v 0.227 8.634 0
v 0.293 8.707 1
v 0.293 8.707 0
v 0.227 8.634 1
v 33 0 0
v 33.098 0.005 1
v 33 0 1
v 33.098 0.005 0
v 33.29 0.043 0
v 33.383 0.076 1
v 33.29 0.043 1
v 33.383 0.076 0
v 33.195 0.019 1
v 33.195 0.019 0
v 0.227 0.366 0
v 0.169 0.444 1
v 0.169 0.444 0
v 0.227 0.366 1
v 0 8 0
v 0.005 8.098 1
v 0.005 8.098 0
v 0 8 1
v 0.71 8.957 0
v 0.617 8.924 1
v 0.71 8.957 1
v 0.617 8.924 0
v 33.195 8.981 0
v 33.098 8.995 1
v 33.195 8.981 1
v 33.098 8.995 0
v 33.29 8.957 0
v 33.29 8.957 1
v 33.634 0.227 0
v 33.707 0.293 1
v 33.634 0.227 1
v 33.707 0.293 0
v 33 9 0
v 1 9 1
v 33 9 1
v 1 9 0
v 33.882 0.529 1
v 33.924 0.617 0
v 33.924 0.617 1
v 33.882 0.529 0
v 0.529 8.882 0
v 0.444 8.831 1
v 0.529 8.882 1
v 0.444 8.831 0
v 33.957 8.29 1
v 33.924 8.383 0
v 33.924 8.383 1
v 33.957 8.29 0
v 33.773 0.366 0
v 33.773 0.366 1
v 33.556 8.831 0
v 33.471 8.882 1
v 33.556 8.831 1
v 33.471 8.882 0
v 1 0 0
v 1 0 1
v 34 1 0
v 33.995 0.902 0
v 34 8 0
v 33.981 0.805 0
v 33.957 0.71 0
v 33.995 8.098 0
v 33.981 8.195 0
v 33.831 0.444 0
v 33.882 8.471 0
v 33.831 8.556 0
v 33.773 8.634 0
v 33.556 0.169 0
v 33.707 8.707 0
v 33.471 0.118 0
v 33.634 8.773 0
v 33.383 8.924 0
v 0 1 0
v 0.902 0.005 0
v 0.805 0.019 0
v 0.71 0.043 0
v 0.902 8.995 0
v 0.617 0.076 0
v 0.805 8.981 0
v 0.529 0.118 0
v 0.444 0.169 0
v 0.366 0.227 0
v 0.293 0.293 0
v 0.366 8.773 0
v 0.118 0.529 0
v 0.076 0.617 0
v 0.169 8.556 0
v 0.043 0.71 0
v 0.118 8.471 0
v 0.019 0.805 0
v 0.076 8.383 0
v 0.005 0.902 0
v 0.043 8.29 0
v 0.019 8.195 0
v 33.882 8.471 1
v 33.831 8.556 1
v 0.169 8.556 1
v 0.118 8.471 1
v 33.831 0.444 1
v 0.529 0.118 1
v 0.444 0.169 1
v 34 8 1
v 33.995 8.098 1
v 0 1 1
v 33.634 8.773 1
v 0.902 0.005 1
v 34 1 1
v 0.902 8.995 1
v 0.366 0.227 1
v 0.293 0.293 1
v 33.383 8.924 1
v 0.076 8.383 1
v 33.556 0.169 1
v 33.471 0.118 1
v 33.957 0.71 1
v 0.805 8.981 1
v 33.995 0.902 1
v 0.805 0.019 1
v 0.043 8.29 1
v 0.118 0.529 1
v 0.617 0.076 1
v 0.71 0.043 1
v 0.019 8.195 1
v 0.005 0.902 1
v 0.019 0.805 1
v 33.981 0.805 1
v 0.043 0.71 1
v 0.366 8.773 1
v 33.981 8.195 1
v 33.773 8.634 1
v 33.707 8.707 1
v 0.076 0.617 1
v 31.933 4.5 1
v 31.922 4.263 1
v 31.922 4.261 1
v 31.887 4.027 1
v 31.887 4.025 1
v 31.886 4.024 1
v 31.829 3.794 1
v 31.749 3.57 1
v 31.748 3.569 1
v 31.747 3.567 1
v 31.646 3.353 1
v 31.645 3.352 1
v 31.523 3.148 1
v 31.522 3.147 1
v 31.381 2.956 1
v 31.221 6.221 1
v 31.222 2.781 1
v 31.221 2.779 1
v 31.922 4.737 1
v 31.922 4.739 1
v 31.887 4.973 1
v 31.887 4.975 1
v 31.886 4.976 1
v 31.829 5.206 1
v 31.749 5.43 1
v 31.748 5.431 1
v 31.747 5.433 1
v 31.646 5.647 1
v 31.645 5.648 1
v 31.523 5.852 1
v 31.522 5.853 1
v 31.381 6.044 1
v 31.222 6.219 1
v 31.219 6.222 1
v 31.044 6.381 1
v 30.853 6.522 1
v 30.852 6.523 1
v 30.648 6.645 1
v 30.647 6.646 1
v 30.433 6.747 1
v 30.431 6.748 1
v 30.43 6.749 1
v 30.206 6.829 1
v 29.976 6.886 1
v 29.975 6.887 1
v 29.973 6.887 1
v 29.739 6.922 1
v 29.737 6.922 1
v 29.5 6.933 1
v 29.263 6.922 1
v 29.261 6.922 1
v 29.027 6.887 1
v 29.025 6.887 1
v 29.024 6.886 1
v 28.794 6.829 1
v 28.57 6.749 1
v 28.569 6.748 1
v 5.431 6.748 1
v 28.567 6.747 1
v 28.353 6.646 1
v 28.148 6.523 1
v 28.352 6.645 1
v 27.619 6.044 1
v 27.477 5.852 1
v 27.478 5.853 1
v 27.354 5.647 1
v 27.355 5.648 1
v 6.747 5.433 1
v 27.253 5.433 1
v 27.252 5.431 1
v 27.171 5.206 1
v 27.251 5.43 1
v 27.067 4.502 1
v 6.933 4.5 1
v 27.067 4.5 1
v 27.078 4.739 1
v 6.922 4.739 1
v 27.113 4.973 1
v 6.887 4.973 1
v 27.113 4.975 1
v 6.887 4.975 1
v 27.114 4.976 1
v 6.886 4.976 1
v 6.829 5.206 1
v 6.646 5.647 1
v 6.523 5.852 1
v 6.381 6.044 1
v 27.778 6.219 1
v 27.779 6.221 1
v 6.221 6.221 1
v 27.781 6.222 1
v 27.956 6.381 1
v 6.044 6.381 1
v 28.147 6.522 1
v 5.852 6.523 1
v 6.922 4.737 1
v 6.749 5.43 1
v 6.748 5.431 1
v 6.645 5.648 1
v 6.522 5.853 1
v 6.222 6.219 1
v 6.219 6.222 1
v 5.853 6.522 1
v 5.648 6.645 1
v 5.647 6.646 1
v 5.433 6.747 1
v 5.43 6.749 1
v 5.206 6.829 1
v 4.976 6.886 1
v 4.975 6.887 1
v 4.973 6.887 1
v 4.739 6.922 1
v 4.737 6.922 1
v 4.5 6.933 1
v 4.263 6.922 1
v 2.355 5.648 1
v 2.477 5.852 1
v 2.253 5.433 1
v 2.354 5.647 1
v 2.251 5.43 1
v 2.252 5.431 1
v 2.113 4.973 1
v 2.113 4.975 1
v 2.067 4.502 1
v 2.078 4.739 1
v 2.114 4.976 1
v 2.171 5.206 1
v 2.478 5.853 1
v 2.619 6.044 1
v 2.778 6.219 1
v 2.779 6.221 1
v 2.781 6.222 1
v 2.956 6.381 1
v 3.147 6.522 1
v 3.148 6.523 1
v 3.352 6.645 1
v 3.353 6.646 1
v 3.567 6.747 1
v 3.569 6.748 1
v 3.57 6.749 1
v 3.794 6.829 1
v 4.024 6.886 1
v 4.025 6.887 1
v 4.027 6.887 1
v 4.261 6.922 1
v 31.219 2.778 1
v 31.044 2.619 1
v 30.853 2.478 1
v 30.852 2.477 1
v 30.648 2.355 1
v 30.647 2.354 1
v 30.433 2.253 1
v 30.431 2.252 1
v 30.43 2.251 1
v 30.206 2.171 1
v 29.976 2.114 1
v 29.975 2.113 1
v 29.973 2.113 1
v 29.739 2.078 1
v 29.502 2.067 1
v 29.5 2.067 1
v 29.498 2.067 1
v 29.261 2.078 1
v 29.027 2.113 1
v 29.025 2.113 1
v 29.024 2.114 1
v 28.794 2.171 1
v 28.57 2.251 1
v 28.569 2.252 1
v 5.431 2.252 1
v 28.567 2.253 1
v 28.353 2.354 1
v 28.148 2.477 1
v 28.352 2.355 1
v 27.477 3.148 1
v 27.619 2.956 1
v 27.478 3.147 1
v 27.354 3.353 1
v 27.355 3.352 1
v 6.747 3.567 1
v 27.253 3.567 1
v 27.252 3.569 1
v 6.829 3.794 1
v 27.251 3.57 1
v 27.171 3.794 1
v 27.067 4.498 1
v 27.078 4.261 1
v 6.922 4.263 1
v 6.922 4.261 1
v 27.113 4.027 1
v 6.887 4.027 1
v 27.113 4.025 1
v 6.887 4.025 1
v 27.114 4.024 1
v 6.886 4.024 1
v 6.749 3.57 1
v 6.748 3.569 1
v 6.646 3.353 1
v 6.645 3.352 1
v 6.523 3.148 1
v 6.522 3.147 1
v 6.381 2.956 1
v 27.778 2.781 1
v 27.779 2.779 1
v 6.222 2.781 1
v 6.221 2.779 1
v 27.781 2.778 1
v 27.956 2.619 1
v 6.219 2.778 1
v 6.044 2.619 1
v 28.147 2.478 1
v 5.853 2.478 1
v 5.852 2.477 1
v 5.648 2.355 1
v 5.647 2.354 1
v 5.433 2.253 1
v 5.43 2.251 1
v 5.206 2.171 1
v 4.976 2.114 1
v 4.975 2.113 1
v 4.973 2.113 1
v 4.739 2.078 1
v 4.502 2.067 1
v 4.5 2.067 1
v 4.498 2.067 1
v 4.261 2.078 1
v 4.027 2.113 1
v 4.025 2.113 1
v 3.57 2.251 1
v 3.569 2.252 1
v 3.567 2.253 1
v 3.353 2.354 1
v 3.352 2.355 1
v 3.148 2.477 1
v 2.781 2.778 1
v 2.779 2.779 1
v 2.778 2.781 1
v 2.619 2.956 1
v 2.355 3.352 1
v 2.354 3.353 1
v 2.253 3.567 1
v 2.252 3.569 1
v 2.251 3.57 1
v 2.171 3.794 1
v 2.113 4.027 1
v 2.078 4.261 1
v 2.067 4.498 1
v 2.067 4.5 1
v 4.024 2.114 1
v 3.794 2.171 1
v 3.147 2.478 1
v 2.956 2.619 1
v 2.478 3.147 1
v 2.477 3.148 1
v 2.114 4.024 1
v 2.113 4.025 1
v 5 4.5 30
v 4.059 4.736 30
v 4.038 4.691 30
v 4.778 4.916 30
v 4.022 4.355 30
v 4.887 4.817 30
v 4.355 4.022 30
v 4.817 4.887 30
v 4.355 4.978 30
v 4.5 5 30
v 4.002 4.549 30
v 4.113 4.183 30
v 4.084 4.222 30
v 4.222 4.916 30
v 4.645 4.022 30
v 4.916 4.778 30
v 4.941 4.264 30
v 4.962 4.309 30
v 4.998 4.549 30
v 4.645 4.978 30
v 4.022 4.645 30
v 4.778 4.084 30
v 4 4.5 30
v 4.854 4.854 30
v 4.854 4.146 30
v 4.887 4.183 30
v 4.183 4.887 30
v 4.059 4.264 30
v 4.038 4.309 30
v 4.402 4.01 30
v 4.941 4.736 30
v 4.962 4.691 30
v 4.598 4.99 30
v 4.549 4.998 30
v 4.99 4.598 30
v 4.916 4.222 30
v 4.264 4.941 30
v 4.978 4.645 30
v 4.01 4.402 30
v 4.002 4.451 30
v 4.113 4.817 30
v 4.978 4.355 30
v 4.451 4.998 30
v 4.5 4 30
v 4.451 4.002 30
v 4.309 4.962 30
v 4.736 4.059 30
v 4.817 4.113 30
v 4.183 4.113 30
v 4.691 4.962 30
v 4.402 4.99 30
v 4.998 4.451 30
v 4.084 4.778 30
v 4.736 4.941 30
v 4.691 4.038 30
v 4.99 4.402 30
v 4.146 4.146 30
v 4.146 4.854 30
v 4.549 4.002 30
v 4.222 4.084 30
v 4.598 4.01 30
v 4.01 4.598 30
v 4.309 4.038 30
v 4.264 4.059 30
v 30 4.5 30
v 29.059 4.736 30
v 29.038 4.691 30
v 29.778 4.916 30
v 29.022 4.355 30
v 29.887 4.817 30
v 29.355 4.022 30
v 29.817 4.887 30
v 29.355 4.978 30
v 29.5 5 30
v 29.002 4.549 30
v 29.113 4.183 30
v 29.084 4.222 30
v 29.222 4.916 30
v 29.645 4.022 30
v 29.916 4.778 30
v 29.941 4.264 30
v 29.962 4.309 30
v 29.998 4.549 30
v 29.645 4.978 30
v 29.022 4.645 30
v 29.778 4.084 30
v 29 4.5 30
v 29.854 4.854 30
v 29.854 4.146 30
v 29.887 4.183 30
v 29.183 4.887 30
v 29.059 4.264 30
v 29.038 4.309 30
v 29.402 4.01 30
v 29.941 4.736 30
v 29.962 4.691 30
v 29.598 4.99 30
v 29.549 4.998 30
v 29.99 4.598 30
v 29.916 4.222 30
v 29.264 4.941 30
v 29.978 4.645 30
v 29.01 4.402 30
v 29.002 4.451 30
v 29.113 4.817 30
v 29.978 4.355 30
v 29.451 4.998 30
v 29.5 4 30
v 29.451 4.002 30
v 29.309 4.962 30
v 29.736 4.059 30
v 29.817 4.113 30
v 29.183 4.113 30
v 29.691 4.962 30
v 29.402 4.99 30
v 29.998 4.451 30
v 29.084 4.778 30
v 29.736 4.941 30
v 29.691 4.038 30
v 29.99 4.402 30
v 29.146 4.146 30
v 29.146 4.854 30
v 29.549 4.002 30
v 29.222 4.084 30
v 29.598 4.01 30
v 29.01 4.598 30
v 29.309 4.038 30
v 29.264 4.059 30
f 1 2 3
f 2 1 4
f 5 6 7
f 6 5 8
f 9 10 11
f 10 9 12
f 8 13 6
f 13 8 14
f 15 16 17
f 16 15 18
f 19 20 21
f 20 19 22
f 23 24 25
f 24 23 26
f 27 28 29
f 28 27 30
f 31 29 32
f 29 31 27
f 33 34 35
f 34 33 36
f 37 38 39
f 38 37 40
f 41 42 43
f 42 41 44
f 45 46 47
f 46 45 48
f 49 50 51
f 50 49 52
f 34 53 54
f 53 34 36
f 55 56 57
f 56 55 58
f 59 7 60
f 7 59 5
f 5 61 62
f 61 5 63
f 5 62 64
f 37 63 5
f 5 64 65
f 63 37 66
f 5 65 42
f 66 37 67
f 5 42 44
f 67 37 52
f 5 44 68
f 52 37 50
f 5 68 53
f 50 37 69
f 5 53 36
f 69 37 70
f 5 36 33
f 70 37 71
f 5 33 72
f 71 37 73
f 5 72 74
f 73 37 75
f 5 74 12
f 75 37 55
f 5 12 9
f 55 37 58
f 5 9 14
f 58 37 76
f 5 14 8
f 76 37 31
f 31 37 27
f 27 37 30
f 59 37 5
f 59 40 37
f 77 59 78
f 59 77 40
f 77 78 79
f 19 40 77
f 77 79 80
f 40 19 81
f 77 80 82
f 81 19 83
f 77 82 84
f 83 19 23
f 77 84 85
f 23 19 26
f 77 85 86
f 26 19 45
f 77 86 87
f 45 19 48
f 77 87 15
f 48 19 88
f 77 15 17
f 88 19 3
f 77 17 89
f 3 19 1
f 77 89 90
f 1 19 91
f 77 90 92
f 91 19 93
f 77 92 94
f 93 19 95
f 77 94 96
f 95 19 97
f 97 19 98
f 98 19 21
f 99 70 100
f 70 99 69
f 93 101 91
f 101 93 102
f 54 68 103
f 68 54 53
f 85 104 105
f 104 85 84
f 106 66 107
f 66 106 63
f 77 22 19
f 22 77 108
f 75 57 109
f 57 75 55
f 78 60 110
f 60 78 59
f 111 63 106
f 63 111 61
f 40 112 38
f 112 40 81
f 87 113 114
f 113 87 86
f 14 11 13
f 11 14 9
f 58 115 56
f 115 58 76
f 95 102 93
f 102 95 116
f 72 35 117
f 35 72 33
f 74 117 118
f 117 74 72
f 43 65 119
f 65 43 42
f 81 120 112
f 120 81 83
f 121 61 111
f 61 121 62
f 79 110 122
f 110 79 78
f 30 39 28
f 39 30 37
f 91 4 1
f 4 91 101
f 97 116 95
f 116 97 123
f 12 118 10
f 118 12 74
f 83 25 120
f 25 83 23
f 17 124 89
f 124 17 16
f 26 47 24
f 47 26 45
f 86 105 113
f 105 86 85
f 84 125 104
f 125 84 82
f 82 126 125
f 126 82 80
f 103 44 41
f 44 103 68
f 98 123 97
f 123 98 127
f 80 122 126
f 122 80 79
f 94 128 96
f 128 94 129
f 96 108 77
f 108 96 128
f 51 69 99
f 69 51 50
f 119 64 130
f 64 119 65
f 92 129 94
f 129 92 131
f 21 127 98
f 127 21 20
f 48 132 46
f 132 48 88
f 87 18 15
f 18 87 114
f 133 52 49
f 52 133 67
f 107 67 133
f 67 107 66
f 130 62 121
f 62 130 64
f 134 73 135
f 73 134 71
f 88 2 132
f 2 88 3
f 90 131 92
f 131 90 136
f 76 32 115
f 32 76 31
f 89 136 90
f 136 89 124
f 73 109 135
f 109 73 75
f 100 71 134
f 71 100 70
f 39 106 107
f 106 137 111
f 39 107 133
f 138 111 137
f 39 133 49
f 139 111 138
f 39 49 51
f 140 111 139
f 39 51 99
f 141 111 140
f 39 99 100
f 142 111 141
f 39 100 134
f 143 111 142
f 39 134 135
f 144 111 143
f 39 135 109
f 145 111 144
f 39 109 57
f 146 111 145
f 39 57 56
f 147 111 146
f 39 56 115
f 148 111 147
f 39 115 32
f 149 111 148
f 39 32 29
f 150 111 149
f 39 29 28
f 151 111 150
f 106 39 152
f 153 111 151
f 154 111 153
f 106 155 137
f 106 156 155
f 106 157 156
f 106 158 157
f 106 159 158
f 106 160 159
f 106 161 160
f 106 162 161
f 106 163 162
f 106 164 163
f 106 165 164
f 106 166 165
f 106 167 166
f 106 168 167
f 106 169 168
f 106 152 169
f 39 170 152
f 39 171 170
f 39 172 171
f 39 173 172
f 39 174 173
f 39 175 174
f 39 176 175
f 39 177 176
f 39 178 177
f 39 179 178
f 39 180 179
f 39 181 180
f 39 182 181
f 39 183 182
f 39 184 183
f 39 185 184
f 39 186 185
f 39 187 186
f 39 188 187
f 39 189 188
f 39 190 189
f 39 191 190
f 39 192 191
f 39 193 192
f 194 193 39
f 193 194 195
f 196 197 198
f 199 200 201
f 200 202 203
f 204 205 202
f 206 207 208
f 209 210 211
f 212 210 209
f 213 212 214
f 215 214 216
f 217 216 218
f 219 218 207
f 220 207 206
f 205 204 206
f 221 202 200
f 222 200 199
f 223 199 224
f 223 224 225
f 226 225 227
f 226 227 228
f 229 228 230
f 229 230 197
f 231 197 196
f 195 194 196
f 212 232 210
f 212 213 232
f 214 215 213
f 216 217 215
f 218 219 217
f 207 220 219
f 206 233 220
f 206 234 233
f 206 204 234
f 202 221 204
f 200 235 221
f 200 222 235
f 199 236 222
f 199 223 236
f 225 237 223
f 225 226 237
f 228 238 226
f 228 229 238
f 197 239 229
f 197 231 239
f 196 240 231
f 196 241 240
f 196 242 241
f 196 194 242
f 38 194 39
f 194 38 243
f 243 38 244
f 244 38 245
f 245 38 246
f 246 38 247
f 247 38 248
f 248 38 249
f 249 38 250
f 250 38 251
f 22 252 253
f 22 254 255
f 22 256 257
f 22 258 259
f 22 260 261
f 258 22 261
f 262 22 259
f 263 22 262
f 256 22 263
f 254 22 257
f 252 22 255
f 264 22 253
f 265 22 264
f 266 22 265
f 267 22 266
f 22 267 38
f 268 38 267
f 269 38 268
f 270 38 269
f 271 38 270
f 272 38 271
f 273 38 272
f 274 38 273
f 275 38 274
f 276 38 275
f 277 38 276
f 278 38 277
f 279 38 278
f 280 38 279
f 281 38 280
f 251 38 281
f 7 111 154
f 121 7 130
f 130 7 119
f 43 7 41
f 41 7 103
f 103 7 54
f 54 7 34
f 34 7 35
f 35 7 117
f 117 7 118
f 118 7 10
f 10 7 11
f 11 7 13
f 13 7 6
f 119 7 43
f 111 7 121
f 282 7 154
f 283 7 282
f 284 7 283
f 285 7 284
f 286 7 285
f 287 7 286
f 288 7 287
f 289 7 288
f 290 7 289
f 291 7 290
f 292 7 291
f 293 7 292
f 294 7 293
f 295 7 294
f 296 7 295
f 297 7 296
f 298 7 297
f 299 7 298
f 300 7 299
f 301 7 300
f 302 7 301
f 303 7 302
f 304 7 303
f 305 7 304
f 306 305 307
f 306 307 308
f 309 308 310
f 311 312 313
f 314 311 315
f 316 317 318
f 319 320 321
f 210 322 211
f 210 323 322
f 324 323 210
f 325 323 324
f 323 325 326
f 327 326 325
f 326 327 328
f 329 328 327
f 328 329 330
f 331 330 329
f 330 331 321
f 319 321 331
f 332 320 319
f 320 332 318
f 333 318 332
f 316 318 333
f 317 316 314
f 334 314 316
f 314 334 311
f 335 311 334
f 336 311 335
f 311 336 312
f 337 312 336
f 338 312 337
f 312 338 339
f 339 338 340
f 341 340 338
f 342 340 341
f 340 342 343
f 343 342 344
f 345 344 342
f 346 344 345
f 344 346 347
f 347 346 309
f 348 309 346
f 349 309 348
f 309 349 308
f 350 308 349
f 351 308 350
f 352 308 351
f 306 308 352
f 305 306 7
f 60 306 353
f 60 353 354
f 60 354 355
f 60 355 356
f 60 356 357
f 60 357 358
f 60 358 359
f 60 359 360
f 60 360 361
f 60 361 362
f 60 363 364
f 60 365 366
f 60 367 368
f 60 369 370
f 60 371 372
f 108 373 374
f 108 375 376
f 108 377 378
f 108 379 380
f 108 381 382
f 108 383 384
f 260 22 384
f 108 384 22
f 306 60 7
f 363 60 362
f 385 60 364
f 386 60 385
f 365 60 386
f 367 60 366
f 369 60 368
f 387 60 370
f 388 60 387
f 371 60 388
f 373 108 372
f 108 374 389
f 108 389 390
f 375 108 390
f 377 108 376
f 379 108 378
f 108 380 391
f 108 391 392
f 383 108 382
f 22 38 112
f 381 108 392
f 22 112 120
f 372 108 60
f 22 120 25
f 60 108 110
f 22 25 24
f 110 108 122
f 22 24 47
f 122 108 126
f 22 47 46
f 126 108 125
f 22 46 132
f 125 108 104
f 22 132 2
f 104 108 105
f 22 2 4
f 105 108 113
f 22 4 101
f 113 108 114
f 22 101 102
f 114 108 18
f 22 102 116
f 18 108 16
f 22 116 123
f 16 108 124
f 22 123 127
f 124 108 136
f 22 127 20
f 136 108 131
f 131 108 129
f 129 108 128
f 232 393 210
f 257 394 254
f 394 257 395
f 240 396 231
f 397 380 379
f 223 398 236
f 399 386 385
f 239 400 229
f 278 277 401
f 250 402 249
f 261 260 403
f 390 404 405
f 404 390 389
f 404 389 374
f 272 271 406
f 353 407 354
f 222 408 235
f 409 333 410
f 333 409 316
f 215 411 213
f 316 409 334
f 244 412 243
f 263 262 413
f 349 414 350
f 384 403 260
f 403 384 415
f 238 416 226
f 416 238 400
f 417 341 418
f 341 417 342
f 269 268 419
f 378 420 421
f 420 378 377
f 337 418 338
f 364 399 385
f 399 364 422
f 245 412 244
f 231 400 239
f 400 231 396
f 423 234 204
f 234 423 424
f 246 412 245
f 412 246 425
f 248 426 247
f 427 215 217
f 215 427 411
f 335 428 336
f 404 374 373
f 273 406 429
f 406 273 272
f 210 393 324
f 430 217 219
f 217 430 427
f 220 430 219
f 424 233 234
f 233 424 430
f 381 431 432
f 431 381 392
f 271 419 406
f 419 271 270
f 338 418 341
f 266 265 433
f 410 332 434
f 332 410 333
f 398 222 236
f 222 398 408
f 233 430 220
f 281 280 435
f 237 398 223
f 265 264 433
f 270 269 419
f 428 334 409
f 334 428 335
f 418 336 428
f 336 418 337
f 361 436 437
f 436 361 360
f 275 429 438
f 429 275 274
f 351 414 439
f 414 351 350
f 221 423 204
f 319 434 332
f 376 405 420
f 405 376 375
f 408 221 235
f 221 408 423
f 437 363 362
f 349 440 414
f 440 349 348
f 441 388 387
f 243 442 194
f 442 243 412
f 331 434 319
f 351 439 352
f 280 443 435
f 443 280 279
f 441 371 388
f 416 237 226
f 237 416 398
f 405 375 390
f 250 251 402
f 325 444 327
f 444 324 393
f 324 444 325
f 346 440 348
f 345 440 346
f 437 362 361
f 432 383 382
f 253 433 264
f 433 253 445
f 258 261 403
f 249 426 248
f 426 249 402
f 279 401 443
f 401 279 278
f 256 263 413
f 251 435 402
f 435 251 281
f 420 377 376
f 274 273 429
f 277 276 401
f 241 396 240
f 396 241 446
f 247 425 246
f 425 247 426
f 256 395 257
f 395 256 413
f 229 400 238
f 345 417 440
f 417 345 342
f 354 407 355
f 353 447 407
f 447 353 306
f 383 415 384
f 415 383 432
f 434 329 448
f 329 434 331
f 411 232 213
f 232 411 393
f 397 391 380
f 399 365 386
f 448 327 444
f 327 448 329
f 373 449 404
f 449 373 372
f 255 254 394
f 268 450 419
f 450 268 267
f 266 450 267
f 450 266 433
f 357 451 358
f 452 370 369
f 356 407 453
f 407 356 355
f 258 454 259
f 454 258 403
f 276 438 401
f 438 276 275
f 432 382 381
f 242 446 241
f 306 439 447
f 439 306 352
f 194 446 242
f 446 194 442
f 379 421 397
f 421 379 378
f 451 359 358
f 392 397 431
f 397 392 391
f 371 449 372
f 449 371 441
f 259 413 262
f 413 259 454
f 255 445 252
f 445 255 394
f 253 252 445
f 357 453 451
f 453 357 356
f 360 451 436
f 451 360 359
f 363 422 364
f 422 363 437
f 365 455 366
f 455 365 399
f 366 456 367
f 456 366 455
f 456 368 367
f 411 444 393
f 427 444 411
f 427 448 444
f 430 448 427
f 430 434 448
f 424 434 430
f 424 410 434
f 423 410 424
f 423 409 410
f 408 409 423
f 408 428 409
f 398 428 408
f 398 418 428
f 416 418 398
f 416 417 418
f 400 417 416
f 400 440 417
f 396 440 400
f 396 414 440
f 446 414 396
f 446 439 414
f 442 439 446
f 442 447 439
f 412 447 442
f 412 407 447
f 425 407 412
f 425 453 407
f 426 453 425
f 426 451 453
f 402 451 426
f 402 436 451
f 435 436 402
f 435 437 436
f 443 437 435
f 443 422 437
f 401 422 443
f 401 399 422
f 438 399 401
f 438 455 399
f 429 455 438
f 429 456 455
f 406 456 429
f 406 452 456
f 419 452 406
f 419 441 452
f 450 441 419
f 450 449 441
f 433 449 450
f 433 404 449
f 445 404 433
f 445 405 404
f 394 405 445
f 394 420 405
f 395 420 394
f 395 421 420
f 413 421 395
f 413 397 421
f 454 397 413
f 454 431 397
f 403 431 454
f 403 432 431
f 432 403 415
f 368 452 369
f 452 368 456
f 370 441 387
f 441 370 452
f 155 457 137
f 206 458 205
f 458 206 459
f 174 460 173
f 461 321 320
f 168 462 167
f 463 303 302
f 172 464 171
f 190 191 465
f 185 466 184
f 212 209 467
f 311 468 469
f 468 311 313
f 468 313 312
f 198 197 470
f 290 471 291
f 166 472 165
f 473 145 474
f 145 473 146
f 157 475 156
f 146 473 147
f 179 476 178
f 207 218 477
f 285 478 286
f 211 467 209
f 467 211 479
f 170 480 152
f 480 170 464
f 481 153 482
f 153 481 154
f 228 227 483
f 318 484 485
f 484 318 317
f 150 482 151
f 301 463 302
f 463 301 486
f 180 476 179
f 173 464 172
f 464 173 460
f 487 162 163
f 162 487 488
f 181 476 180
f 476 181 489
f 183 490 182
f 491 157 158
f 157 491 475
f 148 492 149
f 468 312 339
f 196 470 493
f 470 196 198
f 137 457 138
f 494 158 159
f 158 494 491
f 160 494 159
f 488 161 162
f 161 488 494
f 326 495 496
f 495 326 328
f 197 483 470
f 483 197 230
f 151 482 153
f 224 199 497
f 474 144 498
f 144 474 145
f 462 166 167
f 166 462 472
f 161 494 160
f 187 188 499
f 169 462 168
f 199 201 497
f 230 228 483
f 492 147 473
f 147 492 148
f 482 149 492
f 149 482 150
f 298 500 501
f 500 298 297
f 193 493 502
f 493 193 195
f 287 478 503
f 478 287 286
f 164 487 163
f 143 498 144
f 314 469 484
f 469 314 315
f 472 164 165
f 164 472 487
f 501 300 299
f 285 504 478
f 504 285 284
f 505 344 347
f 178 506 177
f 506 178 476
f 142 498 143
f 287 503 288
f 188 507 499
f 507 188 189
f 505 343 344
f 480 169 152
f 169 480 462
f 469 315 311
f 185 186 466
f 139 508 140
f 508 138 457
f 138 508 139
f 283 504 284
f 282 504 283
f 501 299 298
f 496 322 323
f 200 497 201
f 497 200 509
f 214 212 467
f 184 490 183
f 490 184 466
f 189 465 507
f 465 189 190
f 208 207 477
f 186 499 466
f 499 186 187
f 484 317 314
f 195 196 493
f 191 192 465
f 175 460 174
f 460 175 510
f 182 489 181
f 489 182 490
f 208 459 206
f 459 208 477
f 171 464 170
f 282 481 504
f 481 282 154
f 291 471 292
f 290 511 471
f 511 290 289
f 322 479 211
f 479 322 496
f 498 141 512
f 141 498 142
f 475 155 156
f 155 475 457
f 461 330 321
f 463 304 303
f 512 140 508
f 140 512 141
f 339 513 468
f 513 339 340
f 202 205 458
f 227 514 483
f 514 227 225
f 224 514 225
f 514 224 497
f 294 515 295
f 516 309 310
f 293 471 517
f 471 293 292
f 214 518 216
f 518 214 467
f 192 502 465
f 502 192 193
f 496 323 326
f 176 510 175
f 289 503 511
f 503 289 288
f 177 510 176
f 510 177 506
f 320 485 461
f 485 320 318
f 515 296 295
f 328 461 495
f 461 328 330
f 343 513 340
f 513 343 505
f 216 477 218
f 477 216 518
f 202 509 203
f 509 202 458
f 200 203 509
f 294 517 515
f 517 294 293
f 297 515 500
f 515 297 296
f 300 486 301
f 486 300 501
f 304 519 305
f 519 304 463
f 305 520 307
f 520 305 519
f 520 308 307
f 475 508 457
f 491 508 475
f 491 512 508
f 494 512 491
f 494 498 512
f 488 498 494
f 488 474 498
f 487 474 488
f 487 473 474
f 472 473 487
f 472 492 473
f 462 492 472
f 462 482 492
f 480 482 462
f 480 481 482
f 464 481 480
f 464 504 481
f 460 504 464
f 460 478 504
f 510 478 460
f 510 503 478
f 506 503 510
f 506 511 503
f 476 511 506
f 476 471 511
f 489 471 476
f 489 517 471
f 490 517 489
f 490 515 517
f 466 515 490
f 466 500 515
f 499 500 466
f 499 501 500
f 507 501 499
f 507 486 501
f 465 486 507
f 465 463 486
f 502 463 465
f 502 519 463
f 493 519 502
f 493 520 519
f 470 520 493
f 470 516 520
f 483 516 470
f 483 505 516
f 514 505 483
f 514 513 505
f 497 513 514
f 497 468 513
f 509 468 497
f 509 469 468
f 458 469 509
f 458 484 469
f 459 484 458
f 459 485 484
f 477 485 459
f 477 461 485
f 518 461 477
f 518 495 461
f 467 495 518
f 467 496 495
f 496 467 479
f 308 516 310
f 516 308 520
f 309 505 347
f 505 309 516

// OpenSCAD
// file: modules/Modules.scad
/*
	This program is free software: you can redistribute it and/or modify
	it under the terms of the GNU General Public License as published by
	the Free Software Foundation, either version 3 of the License, or
	(at your option) any later version.

	This program is distributed in the hope that it will be useful,
	but WITHOUT ANY WARRANTY; without even the implied warranty of
	MERCHANTABILITY or FITNESS FOR A PARTICULAR PURPOSE.  See the
	GNU General Public License for more details.
	
	Purpose:  Hold general use modules for to simplify making of objects
	
	History:	
		01/25/2024	Initial creation
		02/17/2025	Added modules for roundedCube, roundedCylinder
								and FilletedCylinder
		02/23/2025	refactored filletedCylinder to include tapered cylinders
								reference filletedCylinderV1 to see original

*/

/***********************************************************************
****** Module - screwHole
	Create a hole specifically for a screw to go in.
***********************************************************************/
//screwHole();
module screwHole(screwHole=4.5, screwDepth = 10, screwHead = 9, headTaper = 2.3, screwHeadDepth = 5, s=$fn){
	$fn = s;
	// Common size screws	
		// Taper
    translate([0,0,-headTaper])cylinder(d1=screwHole, d2=screwHead, h = headTaper);
		// Shaft
    translate([0,0,-headTaper-screwDepth+.01])cylinder(d=screwHole, h=screwDepth);
		// Top of head opening
    translate([0,0,-.01]) cylinder(d=screwHead, h=screwHeadDepth);
}

/***********************************************************************
****** Module - screwCounterPan
	Create a hole specifically for a screw to go in.
	!!!!!!! NOT FINISHED
***********************************************************************/
//screwCounterPan();
module screwCounterPan(screwHole=4.5, screwDepth = 10, screwHead = 9, headTaper = 2.3, screwHeadDepth = 5, s=$fn){
	$fn = s;
	// Common size screws
	
    translate([0,0,-headTaper])cylinder(d1=screwHole, d2=screwHead, h = headTaper, $fn=20);
    translate([0,0,-headTaper-screwDepth])cylinder(d=screwHole, h=screwDepth, $fn=10);
    translate([0,0,-headTaper-screwDepth])cylinder(d=screwHole, h=screwDepth, $fn=10);
    translate([0,0,0]) cylinder(d=screwHead, h=screwHeadDepth, $fn=10);
}

/***********************************************************************
****** Module - screwCounterFlush
	Create a hole specifically for a screw to go in.
	!!!!!!! NOT FINISHED
***********************************************************************/
//screwCounterFlush();
module screwCounterFlush(screwHole=4.5, screwDepth = 10, screwHead = 9, headTaper = 2.3, screwHeadDepth = 5, s=$fn){
	$fn = s;
	// Common size screws
	
    translate([0,0,-headTaper])cylinder(d1=screwHole, d2=screwHead, h = headTaper, $fn=20);
    translate([0,0,-headTaper-screwDepth])cylinder(d=screwHole, h=screwDepth, $fn=10);
    translate([0,0,-headTaper-screwDepth])cylinder(d=screwHole, h=screwDepth, $fn=10);
    translate([0,0,0]) cylinder(d=screwHead, h=screwHeadDepth, $fn=10);
}

/***********************************************************************
****** Module - roundedCube
	4 various ways to make a cube with soft rounded sides.
***********************************************************************/
//roundedCube(x=50, y=30, z=20, r=5, xyz="x");
//roundedCube(x=50, y=30, z=20, r=5, xyz="y");
//roundedCube(x=50, y=30, z=20, r=5, xyz="z");
//roundedCube(x=50, y=30, z=20, r=5, xyz="all");
//roundedCube(x=50, y=30, z=20, r=5, xyz="all", s=60);
//roundedCube(x=50, y=30, z=20, r=5, xyz="all", s=$fn);
module roundedCube(x=50, y=30, z=20, r=5, xyz="z", s=$fn){
	/* variable definitions
			x = value for x axis
			y = value for y axis
			z = value for z axis
			r = radius
			xyz = axis to have the sides rounded
	*/
	$fn = s;
	hull(){
		if (xyz == "z") {
			translate([r,r,0])cylinder(h=z, r=r);
			translate([x-r,r,0])cylinder(h=z, r=r);
			translate([r,y-r,0])cylinder(h=z, r=r);
			translate([x-r,y-r,0])cylinder(h=z, r=r);
		} else if (xyz == "y") {
			translate([r,0,r])rotate([-90,0,0])cylinder(h=y, r=r);
			translate([x-r,0,r])rotate([-90,0,0])cylinder(h=y, r=r);
			translate([r,0,z-r])rotate([-90,0,0])cylinder(h=y, r=r);
			translate([x-r,0,z-r])rotate([-90,0,0])cylinder(h=y, r=r);
		} else if (xyz == "x") {
			translate([0,r,r])rotate([0,90,0])cylinder(h=x, r=r);
			translate([0,y-r,r])rotate([0,90,0])cylinder(h=x, r=r);
			translate([0,r,z-r])rotate([0,90,0])cylinder(h=x, r=r);
			translate([0,y-r,z-r])rotate([0,90,0])cylinder(h=x, r=r);
		} else if (xyz == "all") {
			minkowski(){
				translate([r,r,r])cube([x-r*2,y-r*2,z-r*2]);
				sphere(r=r);
			}			
		} else { 
			echo("XYZ not set");
		}
	}
}

/***********************************************************************
******* Module - roundedCylinder
	Create a cylinder with nice rounded outter top and bottom
***********************************************************************/
//roundedCylinder();
//roundedCylinder(d=200, h=100, r=5);
//roundedCylinder(td=100, bd=100, tr= 10, br = .1);
//difference(){roundedCylinder(d=20, h=10, r=1, s=60);filletedCylinder(d=5, h=10, tr=2, br=1, pad=0, s=30);}
module roundedCylinder(d=200, td=0, bd=0, h=100, r=5, tr=0, br=0, s=$fn){
	$fn = s;

	// Calulate for one or two radises
	tRad = tr > 0 ? tr : r;
	bRad = br > 0 ? br : r;
	//echo(tRad, bRad);

	// Calculate for one diamater or two.
	tDia = td > 0 ? td : d;
	bDia = bd > 0 ? bd : d;
	//echo(tDia, bDia);

	hull(){
		//Bottom
		translate([0,0,bRad])rotate_extrude()translate([bDia/2-bRad,0,0])circle(r=bRad);
		//Top
		translate([0,0,h-tRad])rotate_extrude()translate([tDia/2-tRad,0,0])circle(r=tRad);
	}
}

/***********************************************************************
******* Module - filletedCylinder
	Create a cylinder with flared top and/or bottoms.
	Used for making rounded top/bottom holes in objects.
	Usage:
		d = diamater
		td = top diamater.  d will be used if not provided
		dd = bottom diamater.  d will be used if not provided
		h = height
		r = radius of the fillet
		tr = top radius.  r will be used if not provided
		br = bottom radius.  r will be used if not provided
		pad = filler around the radius  5 is usually good unless very small
		s = smoothing.  generally let $fn of the object do the work.
***********************************************************************/
//filletedCylinder();
//filletedCylinder(d=50, h=100, r=5, pad=5, s=$fn);
//filletedCylinder(d=10, h=20, tr=1, br=1, pad=.1, s=60);
//difference(){roundedCylinder();filletedCylinder();}
//difference(){roundedCylinder(d=200, h=100, r=5);filletedCylinder(d=50, h=100, tr=10, br=5, pad=5);}
//difference(){roundedCylinder(d=20, h=10, r=1, s=30);filletedCylinder(d=5, h=10, tr=2, br=1, pad=0, s=30);}
//filletedCylinder(d=50, td=20, bd=60, h=100, tr=10, br=5, pad=5, s=$fn);
//difference(){roundedCylinder(s=60);filletedCylinder(d=50, td=50, bd=20, h=100, tr=10, br=5, pad=5, s=$fn);}
module filletedCylinder(d=50, td=0, bd=0, h=100, tr=0, br=0, r=5, pad=5, s=$fn){
	$fn = s;
	shift = .1;

	// Calulate for one or two radises
	tRad = tr > 0 ? tr : r;
	bRad = br > 0 ? br : r;
	//echo(tRad, bRad);

	// Calculate for one diamater or two.
	tDia = td > 0 ? td : d;
	bDia = bd > 0 ? bd : d;
	//echo(tDia, bDia);

	// Calculate the shift of the radius in due to angle of a cone
  trShift = tDia > bDia ? tRad * tan(atan(((tDia/2)-(bDia/2))/h)) : 0;
	brShift = bDia > tDia ? bRad * tan(atan(((bDia/2)-(tDia/2))/h)) : 0;
	//echo(trShift, brShift);

	translate([0,0,-shift])cylinder(h=h+shift*2, r1=bDia/2, r2=tDia/2);
	if ( bRad > 0 ){
		// bottom
		translate([0,0,-shift])
			difference(){
				rotate_extrude()translate([bDia/2-pad-brShift,0,0])square([bRad+pad, bRad]);
				rotate_extrude()translate([bDia/2+bRad-brShift,bRad,0])circle(r=bRad);
			}
	}
	if ( tRad > 0 ){
		// top
		translate([0,0,h-tRad+shift])
			difference(){
				rotate_extrude()translate([tDia/2-pad-trShift,0,0])square([tRad+pad, tRad]);
				rotate_extrude()translate([tDia/2+tRad-trShift,0,0])circle(r=tRad);
			}
	}
}

		// v1 kept for reference.  No longer used
		// module filletedCylinderV1(d=50, h=100, tr=10, br=5, pad=5, s=$fn){
		// 	$fn = s;
		// 	shift = .1;
		// 	translate([0,0,-shift])cylinder(h=h+shift*2, r=d/2);
		// 	if ( br > 0 ){
		// 		// bottom
		// 		translate([0,0,-shift])
		// 			difference(){
		// 				rotate_extrude()translate([d/2-pad,0,0])square([br+pad, br]);
		// 				rotate_extrude()translate([d/2+br,br,0])circle(r=br);
		// 			}
		// 	}
		// 	if ( tr > 0 ){
		// 		// top
		// 		translate([0,0,h-tr+shift])
		// 			difference(){
		// 				rotate_extrude()translate([d/2-pad,0,0])square([tr+pad, tr]);
		// 				rotate_extrude()translate([d/2+tr,0,0])circle(r=tr);
		// 			}
		// 	}
		// }

/***********************************************************************
******* Module - CylinderFillet
	Fillet the outter circumfrence of a cylinder.
***********************************************************************/
//difference(){cylinder(h=20, d=100);cylinderFillet(d = 100, r=5);}
/*difference(){
	cylinder(h=20, d=100);
	cylinderFillet(d = 100, r=5);
	translate([0,0,20])rotate([180,0,0])cylinderFillet(d = 100, r=5, s=60);
}*/
module cylinderFillet(d = 100, r=5, s=$fn){
		$fn = s;
		pad = 0.1;	// Padding to maintain manifold
		translate([0,0,0])
		difference() {
				rotate_extrude(convexity=10)
						translate([d/2-r+pad,-pad,0])
								square(r+pad,r+pad);
				#rotate_extrude(convexity=10)
						translate([d/2-r,r,0])
								circle(r=r);
		}
}
// main file
/*
	This program is free software: you can redistribute it and/or modify
	it under the terms of the GNU General Public License as published by
	the Free Software Foundation, either version 3 of the License, or
	(at your option) any later version.

	This program is distributed in the hope that it will be useful,
	but WITHOUT ANY WARRANTY; without even the implied warranty of
	MERCHANTABILITY or FITNESS FOR A PARTICULAR PURPOSE.  See the
	GNU General Public License for more details.
	
	Purpose:  Test retraction settiongs of printer
	GitHub:		
	
	History:	
		MM/DD/YYYY	Initial creation

	Notes:
		- Nothing special see inline notes below

*/

/****** Variables ******************************************************
***********************************************************************/
baseHeight = 1;				// Thickness ov the base
basePadding = 2;			// edge to base of cone space
coneBase = 5;					// width of cone base
coneHeight = 30;			// height of the cone
coneSpacing = 20;			// space between cones
conePoint = 1;				// Suggest larger than nozzle size

// Special variables
$fn = $preview ? 32 : 64;		// 0 is OpenSCAD default

/****** Imports & Includes & Calculations ******************************
***********************************************************************/
include <modules/Modules.scad>

// Global Calculations


/****** The Object *****************************************************
***********************************************************************/
object();

module object(){
	// Rendered Calculations
	baseX = coneBase*2+coneSpacing+basePadding*2;
	baseY = coneBase+basePadding*2;
	
	// Start creating the object
	roundedCube(x=baseX, y=baseY, z=baseHeight, r=1, xyz="z");
	translate([coneBase/2+basePadding, coneBase/2+basePadding, 0])cylinder(h=coneHeight, d1=coneBase, d2=conePoint);
	translate([coneBase/2+basePadding+coneBase+coneSpacing, coneBase/2+basePadding, 0])cylinder(h=coneHeight, d1=coneBase, d2=conePoint);
}

/*Some basic commands
translate([0,0,0])
rotate([0,0,0])
cube([0,0,0]);
difference(){}
*/



/****** Batch Export***************************************************
	Use this module to create multiple exports based on rerenderd values
	https://github.com/bbaumg/3DPrinter/blob/master/export.py
	<modules/export.py>
	
	This script searches for "module export()" and individually renders
	and exports each item in it. Each item is expected to be on its own line. 
	The file name will be the comment on the same line, or the module 
	call if no comment exists. All files will be put in a folder with 
	the same name as the scad file it's created from.
***********************************************************************/
module export() {
	//objectExport(x); //<filename.stl>
}

// Calls this to make minor tweaks for batch rendering
//   e.g. rotation of the object for best viewing
module objectExport(var1){
	echo("Rendering Export");
	// Allows for rotation of object for best orientation of STL file
	//    Likely need to rotate 90-180 on z axis.
	rotate([0,0,0])object(var1);
}
